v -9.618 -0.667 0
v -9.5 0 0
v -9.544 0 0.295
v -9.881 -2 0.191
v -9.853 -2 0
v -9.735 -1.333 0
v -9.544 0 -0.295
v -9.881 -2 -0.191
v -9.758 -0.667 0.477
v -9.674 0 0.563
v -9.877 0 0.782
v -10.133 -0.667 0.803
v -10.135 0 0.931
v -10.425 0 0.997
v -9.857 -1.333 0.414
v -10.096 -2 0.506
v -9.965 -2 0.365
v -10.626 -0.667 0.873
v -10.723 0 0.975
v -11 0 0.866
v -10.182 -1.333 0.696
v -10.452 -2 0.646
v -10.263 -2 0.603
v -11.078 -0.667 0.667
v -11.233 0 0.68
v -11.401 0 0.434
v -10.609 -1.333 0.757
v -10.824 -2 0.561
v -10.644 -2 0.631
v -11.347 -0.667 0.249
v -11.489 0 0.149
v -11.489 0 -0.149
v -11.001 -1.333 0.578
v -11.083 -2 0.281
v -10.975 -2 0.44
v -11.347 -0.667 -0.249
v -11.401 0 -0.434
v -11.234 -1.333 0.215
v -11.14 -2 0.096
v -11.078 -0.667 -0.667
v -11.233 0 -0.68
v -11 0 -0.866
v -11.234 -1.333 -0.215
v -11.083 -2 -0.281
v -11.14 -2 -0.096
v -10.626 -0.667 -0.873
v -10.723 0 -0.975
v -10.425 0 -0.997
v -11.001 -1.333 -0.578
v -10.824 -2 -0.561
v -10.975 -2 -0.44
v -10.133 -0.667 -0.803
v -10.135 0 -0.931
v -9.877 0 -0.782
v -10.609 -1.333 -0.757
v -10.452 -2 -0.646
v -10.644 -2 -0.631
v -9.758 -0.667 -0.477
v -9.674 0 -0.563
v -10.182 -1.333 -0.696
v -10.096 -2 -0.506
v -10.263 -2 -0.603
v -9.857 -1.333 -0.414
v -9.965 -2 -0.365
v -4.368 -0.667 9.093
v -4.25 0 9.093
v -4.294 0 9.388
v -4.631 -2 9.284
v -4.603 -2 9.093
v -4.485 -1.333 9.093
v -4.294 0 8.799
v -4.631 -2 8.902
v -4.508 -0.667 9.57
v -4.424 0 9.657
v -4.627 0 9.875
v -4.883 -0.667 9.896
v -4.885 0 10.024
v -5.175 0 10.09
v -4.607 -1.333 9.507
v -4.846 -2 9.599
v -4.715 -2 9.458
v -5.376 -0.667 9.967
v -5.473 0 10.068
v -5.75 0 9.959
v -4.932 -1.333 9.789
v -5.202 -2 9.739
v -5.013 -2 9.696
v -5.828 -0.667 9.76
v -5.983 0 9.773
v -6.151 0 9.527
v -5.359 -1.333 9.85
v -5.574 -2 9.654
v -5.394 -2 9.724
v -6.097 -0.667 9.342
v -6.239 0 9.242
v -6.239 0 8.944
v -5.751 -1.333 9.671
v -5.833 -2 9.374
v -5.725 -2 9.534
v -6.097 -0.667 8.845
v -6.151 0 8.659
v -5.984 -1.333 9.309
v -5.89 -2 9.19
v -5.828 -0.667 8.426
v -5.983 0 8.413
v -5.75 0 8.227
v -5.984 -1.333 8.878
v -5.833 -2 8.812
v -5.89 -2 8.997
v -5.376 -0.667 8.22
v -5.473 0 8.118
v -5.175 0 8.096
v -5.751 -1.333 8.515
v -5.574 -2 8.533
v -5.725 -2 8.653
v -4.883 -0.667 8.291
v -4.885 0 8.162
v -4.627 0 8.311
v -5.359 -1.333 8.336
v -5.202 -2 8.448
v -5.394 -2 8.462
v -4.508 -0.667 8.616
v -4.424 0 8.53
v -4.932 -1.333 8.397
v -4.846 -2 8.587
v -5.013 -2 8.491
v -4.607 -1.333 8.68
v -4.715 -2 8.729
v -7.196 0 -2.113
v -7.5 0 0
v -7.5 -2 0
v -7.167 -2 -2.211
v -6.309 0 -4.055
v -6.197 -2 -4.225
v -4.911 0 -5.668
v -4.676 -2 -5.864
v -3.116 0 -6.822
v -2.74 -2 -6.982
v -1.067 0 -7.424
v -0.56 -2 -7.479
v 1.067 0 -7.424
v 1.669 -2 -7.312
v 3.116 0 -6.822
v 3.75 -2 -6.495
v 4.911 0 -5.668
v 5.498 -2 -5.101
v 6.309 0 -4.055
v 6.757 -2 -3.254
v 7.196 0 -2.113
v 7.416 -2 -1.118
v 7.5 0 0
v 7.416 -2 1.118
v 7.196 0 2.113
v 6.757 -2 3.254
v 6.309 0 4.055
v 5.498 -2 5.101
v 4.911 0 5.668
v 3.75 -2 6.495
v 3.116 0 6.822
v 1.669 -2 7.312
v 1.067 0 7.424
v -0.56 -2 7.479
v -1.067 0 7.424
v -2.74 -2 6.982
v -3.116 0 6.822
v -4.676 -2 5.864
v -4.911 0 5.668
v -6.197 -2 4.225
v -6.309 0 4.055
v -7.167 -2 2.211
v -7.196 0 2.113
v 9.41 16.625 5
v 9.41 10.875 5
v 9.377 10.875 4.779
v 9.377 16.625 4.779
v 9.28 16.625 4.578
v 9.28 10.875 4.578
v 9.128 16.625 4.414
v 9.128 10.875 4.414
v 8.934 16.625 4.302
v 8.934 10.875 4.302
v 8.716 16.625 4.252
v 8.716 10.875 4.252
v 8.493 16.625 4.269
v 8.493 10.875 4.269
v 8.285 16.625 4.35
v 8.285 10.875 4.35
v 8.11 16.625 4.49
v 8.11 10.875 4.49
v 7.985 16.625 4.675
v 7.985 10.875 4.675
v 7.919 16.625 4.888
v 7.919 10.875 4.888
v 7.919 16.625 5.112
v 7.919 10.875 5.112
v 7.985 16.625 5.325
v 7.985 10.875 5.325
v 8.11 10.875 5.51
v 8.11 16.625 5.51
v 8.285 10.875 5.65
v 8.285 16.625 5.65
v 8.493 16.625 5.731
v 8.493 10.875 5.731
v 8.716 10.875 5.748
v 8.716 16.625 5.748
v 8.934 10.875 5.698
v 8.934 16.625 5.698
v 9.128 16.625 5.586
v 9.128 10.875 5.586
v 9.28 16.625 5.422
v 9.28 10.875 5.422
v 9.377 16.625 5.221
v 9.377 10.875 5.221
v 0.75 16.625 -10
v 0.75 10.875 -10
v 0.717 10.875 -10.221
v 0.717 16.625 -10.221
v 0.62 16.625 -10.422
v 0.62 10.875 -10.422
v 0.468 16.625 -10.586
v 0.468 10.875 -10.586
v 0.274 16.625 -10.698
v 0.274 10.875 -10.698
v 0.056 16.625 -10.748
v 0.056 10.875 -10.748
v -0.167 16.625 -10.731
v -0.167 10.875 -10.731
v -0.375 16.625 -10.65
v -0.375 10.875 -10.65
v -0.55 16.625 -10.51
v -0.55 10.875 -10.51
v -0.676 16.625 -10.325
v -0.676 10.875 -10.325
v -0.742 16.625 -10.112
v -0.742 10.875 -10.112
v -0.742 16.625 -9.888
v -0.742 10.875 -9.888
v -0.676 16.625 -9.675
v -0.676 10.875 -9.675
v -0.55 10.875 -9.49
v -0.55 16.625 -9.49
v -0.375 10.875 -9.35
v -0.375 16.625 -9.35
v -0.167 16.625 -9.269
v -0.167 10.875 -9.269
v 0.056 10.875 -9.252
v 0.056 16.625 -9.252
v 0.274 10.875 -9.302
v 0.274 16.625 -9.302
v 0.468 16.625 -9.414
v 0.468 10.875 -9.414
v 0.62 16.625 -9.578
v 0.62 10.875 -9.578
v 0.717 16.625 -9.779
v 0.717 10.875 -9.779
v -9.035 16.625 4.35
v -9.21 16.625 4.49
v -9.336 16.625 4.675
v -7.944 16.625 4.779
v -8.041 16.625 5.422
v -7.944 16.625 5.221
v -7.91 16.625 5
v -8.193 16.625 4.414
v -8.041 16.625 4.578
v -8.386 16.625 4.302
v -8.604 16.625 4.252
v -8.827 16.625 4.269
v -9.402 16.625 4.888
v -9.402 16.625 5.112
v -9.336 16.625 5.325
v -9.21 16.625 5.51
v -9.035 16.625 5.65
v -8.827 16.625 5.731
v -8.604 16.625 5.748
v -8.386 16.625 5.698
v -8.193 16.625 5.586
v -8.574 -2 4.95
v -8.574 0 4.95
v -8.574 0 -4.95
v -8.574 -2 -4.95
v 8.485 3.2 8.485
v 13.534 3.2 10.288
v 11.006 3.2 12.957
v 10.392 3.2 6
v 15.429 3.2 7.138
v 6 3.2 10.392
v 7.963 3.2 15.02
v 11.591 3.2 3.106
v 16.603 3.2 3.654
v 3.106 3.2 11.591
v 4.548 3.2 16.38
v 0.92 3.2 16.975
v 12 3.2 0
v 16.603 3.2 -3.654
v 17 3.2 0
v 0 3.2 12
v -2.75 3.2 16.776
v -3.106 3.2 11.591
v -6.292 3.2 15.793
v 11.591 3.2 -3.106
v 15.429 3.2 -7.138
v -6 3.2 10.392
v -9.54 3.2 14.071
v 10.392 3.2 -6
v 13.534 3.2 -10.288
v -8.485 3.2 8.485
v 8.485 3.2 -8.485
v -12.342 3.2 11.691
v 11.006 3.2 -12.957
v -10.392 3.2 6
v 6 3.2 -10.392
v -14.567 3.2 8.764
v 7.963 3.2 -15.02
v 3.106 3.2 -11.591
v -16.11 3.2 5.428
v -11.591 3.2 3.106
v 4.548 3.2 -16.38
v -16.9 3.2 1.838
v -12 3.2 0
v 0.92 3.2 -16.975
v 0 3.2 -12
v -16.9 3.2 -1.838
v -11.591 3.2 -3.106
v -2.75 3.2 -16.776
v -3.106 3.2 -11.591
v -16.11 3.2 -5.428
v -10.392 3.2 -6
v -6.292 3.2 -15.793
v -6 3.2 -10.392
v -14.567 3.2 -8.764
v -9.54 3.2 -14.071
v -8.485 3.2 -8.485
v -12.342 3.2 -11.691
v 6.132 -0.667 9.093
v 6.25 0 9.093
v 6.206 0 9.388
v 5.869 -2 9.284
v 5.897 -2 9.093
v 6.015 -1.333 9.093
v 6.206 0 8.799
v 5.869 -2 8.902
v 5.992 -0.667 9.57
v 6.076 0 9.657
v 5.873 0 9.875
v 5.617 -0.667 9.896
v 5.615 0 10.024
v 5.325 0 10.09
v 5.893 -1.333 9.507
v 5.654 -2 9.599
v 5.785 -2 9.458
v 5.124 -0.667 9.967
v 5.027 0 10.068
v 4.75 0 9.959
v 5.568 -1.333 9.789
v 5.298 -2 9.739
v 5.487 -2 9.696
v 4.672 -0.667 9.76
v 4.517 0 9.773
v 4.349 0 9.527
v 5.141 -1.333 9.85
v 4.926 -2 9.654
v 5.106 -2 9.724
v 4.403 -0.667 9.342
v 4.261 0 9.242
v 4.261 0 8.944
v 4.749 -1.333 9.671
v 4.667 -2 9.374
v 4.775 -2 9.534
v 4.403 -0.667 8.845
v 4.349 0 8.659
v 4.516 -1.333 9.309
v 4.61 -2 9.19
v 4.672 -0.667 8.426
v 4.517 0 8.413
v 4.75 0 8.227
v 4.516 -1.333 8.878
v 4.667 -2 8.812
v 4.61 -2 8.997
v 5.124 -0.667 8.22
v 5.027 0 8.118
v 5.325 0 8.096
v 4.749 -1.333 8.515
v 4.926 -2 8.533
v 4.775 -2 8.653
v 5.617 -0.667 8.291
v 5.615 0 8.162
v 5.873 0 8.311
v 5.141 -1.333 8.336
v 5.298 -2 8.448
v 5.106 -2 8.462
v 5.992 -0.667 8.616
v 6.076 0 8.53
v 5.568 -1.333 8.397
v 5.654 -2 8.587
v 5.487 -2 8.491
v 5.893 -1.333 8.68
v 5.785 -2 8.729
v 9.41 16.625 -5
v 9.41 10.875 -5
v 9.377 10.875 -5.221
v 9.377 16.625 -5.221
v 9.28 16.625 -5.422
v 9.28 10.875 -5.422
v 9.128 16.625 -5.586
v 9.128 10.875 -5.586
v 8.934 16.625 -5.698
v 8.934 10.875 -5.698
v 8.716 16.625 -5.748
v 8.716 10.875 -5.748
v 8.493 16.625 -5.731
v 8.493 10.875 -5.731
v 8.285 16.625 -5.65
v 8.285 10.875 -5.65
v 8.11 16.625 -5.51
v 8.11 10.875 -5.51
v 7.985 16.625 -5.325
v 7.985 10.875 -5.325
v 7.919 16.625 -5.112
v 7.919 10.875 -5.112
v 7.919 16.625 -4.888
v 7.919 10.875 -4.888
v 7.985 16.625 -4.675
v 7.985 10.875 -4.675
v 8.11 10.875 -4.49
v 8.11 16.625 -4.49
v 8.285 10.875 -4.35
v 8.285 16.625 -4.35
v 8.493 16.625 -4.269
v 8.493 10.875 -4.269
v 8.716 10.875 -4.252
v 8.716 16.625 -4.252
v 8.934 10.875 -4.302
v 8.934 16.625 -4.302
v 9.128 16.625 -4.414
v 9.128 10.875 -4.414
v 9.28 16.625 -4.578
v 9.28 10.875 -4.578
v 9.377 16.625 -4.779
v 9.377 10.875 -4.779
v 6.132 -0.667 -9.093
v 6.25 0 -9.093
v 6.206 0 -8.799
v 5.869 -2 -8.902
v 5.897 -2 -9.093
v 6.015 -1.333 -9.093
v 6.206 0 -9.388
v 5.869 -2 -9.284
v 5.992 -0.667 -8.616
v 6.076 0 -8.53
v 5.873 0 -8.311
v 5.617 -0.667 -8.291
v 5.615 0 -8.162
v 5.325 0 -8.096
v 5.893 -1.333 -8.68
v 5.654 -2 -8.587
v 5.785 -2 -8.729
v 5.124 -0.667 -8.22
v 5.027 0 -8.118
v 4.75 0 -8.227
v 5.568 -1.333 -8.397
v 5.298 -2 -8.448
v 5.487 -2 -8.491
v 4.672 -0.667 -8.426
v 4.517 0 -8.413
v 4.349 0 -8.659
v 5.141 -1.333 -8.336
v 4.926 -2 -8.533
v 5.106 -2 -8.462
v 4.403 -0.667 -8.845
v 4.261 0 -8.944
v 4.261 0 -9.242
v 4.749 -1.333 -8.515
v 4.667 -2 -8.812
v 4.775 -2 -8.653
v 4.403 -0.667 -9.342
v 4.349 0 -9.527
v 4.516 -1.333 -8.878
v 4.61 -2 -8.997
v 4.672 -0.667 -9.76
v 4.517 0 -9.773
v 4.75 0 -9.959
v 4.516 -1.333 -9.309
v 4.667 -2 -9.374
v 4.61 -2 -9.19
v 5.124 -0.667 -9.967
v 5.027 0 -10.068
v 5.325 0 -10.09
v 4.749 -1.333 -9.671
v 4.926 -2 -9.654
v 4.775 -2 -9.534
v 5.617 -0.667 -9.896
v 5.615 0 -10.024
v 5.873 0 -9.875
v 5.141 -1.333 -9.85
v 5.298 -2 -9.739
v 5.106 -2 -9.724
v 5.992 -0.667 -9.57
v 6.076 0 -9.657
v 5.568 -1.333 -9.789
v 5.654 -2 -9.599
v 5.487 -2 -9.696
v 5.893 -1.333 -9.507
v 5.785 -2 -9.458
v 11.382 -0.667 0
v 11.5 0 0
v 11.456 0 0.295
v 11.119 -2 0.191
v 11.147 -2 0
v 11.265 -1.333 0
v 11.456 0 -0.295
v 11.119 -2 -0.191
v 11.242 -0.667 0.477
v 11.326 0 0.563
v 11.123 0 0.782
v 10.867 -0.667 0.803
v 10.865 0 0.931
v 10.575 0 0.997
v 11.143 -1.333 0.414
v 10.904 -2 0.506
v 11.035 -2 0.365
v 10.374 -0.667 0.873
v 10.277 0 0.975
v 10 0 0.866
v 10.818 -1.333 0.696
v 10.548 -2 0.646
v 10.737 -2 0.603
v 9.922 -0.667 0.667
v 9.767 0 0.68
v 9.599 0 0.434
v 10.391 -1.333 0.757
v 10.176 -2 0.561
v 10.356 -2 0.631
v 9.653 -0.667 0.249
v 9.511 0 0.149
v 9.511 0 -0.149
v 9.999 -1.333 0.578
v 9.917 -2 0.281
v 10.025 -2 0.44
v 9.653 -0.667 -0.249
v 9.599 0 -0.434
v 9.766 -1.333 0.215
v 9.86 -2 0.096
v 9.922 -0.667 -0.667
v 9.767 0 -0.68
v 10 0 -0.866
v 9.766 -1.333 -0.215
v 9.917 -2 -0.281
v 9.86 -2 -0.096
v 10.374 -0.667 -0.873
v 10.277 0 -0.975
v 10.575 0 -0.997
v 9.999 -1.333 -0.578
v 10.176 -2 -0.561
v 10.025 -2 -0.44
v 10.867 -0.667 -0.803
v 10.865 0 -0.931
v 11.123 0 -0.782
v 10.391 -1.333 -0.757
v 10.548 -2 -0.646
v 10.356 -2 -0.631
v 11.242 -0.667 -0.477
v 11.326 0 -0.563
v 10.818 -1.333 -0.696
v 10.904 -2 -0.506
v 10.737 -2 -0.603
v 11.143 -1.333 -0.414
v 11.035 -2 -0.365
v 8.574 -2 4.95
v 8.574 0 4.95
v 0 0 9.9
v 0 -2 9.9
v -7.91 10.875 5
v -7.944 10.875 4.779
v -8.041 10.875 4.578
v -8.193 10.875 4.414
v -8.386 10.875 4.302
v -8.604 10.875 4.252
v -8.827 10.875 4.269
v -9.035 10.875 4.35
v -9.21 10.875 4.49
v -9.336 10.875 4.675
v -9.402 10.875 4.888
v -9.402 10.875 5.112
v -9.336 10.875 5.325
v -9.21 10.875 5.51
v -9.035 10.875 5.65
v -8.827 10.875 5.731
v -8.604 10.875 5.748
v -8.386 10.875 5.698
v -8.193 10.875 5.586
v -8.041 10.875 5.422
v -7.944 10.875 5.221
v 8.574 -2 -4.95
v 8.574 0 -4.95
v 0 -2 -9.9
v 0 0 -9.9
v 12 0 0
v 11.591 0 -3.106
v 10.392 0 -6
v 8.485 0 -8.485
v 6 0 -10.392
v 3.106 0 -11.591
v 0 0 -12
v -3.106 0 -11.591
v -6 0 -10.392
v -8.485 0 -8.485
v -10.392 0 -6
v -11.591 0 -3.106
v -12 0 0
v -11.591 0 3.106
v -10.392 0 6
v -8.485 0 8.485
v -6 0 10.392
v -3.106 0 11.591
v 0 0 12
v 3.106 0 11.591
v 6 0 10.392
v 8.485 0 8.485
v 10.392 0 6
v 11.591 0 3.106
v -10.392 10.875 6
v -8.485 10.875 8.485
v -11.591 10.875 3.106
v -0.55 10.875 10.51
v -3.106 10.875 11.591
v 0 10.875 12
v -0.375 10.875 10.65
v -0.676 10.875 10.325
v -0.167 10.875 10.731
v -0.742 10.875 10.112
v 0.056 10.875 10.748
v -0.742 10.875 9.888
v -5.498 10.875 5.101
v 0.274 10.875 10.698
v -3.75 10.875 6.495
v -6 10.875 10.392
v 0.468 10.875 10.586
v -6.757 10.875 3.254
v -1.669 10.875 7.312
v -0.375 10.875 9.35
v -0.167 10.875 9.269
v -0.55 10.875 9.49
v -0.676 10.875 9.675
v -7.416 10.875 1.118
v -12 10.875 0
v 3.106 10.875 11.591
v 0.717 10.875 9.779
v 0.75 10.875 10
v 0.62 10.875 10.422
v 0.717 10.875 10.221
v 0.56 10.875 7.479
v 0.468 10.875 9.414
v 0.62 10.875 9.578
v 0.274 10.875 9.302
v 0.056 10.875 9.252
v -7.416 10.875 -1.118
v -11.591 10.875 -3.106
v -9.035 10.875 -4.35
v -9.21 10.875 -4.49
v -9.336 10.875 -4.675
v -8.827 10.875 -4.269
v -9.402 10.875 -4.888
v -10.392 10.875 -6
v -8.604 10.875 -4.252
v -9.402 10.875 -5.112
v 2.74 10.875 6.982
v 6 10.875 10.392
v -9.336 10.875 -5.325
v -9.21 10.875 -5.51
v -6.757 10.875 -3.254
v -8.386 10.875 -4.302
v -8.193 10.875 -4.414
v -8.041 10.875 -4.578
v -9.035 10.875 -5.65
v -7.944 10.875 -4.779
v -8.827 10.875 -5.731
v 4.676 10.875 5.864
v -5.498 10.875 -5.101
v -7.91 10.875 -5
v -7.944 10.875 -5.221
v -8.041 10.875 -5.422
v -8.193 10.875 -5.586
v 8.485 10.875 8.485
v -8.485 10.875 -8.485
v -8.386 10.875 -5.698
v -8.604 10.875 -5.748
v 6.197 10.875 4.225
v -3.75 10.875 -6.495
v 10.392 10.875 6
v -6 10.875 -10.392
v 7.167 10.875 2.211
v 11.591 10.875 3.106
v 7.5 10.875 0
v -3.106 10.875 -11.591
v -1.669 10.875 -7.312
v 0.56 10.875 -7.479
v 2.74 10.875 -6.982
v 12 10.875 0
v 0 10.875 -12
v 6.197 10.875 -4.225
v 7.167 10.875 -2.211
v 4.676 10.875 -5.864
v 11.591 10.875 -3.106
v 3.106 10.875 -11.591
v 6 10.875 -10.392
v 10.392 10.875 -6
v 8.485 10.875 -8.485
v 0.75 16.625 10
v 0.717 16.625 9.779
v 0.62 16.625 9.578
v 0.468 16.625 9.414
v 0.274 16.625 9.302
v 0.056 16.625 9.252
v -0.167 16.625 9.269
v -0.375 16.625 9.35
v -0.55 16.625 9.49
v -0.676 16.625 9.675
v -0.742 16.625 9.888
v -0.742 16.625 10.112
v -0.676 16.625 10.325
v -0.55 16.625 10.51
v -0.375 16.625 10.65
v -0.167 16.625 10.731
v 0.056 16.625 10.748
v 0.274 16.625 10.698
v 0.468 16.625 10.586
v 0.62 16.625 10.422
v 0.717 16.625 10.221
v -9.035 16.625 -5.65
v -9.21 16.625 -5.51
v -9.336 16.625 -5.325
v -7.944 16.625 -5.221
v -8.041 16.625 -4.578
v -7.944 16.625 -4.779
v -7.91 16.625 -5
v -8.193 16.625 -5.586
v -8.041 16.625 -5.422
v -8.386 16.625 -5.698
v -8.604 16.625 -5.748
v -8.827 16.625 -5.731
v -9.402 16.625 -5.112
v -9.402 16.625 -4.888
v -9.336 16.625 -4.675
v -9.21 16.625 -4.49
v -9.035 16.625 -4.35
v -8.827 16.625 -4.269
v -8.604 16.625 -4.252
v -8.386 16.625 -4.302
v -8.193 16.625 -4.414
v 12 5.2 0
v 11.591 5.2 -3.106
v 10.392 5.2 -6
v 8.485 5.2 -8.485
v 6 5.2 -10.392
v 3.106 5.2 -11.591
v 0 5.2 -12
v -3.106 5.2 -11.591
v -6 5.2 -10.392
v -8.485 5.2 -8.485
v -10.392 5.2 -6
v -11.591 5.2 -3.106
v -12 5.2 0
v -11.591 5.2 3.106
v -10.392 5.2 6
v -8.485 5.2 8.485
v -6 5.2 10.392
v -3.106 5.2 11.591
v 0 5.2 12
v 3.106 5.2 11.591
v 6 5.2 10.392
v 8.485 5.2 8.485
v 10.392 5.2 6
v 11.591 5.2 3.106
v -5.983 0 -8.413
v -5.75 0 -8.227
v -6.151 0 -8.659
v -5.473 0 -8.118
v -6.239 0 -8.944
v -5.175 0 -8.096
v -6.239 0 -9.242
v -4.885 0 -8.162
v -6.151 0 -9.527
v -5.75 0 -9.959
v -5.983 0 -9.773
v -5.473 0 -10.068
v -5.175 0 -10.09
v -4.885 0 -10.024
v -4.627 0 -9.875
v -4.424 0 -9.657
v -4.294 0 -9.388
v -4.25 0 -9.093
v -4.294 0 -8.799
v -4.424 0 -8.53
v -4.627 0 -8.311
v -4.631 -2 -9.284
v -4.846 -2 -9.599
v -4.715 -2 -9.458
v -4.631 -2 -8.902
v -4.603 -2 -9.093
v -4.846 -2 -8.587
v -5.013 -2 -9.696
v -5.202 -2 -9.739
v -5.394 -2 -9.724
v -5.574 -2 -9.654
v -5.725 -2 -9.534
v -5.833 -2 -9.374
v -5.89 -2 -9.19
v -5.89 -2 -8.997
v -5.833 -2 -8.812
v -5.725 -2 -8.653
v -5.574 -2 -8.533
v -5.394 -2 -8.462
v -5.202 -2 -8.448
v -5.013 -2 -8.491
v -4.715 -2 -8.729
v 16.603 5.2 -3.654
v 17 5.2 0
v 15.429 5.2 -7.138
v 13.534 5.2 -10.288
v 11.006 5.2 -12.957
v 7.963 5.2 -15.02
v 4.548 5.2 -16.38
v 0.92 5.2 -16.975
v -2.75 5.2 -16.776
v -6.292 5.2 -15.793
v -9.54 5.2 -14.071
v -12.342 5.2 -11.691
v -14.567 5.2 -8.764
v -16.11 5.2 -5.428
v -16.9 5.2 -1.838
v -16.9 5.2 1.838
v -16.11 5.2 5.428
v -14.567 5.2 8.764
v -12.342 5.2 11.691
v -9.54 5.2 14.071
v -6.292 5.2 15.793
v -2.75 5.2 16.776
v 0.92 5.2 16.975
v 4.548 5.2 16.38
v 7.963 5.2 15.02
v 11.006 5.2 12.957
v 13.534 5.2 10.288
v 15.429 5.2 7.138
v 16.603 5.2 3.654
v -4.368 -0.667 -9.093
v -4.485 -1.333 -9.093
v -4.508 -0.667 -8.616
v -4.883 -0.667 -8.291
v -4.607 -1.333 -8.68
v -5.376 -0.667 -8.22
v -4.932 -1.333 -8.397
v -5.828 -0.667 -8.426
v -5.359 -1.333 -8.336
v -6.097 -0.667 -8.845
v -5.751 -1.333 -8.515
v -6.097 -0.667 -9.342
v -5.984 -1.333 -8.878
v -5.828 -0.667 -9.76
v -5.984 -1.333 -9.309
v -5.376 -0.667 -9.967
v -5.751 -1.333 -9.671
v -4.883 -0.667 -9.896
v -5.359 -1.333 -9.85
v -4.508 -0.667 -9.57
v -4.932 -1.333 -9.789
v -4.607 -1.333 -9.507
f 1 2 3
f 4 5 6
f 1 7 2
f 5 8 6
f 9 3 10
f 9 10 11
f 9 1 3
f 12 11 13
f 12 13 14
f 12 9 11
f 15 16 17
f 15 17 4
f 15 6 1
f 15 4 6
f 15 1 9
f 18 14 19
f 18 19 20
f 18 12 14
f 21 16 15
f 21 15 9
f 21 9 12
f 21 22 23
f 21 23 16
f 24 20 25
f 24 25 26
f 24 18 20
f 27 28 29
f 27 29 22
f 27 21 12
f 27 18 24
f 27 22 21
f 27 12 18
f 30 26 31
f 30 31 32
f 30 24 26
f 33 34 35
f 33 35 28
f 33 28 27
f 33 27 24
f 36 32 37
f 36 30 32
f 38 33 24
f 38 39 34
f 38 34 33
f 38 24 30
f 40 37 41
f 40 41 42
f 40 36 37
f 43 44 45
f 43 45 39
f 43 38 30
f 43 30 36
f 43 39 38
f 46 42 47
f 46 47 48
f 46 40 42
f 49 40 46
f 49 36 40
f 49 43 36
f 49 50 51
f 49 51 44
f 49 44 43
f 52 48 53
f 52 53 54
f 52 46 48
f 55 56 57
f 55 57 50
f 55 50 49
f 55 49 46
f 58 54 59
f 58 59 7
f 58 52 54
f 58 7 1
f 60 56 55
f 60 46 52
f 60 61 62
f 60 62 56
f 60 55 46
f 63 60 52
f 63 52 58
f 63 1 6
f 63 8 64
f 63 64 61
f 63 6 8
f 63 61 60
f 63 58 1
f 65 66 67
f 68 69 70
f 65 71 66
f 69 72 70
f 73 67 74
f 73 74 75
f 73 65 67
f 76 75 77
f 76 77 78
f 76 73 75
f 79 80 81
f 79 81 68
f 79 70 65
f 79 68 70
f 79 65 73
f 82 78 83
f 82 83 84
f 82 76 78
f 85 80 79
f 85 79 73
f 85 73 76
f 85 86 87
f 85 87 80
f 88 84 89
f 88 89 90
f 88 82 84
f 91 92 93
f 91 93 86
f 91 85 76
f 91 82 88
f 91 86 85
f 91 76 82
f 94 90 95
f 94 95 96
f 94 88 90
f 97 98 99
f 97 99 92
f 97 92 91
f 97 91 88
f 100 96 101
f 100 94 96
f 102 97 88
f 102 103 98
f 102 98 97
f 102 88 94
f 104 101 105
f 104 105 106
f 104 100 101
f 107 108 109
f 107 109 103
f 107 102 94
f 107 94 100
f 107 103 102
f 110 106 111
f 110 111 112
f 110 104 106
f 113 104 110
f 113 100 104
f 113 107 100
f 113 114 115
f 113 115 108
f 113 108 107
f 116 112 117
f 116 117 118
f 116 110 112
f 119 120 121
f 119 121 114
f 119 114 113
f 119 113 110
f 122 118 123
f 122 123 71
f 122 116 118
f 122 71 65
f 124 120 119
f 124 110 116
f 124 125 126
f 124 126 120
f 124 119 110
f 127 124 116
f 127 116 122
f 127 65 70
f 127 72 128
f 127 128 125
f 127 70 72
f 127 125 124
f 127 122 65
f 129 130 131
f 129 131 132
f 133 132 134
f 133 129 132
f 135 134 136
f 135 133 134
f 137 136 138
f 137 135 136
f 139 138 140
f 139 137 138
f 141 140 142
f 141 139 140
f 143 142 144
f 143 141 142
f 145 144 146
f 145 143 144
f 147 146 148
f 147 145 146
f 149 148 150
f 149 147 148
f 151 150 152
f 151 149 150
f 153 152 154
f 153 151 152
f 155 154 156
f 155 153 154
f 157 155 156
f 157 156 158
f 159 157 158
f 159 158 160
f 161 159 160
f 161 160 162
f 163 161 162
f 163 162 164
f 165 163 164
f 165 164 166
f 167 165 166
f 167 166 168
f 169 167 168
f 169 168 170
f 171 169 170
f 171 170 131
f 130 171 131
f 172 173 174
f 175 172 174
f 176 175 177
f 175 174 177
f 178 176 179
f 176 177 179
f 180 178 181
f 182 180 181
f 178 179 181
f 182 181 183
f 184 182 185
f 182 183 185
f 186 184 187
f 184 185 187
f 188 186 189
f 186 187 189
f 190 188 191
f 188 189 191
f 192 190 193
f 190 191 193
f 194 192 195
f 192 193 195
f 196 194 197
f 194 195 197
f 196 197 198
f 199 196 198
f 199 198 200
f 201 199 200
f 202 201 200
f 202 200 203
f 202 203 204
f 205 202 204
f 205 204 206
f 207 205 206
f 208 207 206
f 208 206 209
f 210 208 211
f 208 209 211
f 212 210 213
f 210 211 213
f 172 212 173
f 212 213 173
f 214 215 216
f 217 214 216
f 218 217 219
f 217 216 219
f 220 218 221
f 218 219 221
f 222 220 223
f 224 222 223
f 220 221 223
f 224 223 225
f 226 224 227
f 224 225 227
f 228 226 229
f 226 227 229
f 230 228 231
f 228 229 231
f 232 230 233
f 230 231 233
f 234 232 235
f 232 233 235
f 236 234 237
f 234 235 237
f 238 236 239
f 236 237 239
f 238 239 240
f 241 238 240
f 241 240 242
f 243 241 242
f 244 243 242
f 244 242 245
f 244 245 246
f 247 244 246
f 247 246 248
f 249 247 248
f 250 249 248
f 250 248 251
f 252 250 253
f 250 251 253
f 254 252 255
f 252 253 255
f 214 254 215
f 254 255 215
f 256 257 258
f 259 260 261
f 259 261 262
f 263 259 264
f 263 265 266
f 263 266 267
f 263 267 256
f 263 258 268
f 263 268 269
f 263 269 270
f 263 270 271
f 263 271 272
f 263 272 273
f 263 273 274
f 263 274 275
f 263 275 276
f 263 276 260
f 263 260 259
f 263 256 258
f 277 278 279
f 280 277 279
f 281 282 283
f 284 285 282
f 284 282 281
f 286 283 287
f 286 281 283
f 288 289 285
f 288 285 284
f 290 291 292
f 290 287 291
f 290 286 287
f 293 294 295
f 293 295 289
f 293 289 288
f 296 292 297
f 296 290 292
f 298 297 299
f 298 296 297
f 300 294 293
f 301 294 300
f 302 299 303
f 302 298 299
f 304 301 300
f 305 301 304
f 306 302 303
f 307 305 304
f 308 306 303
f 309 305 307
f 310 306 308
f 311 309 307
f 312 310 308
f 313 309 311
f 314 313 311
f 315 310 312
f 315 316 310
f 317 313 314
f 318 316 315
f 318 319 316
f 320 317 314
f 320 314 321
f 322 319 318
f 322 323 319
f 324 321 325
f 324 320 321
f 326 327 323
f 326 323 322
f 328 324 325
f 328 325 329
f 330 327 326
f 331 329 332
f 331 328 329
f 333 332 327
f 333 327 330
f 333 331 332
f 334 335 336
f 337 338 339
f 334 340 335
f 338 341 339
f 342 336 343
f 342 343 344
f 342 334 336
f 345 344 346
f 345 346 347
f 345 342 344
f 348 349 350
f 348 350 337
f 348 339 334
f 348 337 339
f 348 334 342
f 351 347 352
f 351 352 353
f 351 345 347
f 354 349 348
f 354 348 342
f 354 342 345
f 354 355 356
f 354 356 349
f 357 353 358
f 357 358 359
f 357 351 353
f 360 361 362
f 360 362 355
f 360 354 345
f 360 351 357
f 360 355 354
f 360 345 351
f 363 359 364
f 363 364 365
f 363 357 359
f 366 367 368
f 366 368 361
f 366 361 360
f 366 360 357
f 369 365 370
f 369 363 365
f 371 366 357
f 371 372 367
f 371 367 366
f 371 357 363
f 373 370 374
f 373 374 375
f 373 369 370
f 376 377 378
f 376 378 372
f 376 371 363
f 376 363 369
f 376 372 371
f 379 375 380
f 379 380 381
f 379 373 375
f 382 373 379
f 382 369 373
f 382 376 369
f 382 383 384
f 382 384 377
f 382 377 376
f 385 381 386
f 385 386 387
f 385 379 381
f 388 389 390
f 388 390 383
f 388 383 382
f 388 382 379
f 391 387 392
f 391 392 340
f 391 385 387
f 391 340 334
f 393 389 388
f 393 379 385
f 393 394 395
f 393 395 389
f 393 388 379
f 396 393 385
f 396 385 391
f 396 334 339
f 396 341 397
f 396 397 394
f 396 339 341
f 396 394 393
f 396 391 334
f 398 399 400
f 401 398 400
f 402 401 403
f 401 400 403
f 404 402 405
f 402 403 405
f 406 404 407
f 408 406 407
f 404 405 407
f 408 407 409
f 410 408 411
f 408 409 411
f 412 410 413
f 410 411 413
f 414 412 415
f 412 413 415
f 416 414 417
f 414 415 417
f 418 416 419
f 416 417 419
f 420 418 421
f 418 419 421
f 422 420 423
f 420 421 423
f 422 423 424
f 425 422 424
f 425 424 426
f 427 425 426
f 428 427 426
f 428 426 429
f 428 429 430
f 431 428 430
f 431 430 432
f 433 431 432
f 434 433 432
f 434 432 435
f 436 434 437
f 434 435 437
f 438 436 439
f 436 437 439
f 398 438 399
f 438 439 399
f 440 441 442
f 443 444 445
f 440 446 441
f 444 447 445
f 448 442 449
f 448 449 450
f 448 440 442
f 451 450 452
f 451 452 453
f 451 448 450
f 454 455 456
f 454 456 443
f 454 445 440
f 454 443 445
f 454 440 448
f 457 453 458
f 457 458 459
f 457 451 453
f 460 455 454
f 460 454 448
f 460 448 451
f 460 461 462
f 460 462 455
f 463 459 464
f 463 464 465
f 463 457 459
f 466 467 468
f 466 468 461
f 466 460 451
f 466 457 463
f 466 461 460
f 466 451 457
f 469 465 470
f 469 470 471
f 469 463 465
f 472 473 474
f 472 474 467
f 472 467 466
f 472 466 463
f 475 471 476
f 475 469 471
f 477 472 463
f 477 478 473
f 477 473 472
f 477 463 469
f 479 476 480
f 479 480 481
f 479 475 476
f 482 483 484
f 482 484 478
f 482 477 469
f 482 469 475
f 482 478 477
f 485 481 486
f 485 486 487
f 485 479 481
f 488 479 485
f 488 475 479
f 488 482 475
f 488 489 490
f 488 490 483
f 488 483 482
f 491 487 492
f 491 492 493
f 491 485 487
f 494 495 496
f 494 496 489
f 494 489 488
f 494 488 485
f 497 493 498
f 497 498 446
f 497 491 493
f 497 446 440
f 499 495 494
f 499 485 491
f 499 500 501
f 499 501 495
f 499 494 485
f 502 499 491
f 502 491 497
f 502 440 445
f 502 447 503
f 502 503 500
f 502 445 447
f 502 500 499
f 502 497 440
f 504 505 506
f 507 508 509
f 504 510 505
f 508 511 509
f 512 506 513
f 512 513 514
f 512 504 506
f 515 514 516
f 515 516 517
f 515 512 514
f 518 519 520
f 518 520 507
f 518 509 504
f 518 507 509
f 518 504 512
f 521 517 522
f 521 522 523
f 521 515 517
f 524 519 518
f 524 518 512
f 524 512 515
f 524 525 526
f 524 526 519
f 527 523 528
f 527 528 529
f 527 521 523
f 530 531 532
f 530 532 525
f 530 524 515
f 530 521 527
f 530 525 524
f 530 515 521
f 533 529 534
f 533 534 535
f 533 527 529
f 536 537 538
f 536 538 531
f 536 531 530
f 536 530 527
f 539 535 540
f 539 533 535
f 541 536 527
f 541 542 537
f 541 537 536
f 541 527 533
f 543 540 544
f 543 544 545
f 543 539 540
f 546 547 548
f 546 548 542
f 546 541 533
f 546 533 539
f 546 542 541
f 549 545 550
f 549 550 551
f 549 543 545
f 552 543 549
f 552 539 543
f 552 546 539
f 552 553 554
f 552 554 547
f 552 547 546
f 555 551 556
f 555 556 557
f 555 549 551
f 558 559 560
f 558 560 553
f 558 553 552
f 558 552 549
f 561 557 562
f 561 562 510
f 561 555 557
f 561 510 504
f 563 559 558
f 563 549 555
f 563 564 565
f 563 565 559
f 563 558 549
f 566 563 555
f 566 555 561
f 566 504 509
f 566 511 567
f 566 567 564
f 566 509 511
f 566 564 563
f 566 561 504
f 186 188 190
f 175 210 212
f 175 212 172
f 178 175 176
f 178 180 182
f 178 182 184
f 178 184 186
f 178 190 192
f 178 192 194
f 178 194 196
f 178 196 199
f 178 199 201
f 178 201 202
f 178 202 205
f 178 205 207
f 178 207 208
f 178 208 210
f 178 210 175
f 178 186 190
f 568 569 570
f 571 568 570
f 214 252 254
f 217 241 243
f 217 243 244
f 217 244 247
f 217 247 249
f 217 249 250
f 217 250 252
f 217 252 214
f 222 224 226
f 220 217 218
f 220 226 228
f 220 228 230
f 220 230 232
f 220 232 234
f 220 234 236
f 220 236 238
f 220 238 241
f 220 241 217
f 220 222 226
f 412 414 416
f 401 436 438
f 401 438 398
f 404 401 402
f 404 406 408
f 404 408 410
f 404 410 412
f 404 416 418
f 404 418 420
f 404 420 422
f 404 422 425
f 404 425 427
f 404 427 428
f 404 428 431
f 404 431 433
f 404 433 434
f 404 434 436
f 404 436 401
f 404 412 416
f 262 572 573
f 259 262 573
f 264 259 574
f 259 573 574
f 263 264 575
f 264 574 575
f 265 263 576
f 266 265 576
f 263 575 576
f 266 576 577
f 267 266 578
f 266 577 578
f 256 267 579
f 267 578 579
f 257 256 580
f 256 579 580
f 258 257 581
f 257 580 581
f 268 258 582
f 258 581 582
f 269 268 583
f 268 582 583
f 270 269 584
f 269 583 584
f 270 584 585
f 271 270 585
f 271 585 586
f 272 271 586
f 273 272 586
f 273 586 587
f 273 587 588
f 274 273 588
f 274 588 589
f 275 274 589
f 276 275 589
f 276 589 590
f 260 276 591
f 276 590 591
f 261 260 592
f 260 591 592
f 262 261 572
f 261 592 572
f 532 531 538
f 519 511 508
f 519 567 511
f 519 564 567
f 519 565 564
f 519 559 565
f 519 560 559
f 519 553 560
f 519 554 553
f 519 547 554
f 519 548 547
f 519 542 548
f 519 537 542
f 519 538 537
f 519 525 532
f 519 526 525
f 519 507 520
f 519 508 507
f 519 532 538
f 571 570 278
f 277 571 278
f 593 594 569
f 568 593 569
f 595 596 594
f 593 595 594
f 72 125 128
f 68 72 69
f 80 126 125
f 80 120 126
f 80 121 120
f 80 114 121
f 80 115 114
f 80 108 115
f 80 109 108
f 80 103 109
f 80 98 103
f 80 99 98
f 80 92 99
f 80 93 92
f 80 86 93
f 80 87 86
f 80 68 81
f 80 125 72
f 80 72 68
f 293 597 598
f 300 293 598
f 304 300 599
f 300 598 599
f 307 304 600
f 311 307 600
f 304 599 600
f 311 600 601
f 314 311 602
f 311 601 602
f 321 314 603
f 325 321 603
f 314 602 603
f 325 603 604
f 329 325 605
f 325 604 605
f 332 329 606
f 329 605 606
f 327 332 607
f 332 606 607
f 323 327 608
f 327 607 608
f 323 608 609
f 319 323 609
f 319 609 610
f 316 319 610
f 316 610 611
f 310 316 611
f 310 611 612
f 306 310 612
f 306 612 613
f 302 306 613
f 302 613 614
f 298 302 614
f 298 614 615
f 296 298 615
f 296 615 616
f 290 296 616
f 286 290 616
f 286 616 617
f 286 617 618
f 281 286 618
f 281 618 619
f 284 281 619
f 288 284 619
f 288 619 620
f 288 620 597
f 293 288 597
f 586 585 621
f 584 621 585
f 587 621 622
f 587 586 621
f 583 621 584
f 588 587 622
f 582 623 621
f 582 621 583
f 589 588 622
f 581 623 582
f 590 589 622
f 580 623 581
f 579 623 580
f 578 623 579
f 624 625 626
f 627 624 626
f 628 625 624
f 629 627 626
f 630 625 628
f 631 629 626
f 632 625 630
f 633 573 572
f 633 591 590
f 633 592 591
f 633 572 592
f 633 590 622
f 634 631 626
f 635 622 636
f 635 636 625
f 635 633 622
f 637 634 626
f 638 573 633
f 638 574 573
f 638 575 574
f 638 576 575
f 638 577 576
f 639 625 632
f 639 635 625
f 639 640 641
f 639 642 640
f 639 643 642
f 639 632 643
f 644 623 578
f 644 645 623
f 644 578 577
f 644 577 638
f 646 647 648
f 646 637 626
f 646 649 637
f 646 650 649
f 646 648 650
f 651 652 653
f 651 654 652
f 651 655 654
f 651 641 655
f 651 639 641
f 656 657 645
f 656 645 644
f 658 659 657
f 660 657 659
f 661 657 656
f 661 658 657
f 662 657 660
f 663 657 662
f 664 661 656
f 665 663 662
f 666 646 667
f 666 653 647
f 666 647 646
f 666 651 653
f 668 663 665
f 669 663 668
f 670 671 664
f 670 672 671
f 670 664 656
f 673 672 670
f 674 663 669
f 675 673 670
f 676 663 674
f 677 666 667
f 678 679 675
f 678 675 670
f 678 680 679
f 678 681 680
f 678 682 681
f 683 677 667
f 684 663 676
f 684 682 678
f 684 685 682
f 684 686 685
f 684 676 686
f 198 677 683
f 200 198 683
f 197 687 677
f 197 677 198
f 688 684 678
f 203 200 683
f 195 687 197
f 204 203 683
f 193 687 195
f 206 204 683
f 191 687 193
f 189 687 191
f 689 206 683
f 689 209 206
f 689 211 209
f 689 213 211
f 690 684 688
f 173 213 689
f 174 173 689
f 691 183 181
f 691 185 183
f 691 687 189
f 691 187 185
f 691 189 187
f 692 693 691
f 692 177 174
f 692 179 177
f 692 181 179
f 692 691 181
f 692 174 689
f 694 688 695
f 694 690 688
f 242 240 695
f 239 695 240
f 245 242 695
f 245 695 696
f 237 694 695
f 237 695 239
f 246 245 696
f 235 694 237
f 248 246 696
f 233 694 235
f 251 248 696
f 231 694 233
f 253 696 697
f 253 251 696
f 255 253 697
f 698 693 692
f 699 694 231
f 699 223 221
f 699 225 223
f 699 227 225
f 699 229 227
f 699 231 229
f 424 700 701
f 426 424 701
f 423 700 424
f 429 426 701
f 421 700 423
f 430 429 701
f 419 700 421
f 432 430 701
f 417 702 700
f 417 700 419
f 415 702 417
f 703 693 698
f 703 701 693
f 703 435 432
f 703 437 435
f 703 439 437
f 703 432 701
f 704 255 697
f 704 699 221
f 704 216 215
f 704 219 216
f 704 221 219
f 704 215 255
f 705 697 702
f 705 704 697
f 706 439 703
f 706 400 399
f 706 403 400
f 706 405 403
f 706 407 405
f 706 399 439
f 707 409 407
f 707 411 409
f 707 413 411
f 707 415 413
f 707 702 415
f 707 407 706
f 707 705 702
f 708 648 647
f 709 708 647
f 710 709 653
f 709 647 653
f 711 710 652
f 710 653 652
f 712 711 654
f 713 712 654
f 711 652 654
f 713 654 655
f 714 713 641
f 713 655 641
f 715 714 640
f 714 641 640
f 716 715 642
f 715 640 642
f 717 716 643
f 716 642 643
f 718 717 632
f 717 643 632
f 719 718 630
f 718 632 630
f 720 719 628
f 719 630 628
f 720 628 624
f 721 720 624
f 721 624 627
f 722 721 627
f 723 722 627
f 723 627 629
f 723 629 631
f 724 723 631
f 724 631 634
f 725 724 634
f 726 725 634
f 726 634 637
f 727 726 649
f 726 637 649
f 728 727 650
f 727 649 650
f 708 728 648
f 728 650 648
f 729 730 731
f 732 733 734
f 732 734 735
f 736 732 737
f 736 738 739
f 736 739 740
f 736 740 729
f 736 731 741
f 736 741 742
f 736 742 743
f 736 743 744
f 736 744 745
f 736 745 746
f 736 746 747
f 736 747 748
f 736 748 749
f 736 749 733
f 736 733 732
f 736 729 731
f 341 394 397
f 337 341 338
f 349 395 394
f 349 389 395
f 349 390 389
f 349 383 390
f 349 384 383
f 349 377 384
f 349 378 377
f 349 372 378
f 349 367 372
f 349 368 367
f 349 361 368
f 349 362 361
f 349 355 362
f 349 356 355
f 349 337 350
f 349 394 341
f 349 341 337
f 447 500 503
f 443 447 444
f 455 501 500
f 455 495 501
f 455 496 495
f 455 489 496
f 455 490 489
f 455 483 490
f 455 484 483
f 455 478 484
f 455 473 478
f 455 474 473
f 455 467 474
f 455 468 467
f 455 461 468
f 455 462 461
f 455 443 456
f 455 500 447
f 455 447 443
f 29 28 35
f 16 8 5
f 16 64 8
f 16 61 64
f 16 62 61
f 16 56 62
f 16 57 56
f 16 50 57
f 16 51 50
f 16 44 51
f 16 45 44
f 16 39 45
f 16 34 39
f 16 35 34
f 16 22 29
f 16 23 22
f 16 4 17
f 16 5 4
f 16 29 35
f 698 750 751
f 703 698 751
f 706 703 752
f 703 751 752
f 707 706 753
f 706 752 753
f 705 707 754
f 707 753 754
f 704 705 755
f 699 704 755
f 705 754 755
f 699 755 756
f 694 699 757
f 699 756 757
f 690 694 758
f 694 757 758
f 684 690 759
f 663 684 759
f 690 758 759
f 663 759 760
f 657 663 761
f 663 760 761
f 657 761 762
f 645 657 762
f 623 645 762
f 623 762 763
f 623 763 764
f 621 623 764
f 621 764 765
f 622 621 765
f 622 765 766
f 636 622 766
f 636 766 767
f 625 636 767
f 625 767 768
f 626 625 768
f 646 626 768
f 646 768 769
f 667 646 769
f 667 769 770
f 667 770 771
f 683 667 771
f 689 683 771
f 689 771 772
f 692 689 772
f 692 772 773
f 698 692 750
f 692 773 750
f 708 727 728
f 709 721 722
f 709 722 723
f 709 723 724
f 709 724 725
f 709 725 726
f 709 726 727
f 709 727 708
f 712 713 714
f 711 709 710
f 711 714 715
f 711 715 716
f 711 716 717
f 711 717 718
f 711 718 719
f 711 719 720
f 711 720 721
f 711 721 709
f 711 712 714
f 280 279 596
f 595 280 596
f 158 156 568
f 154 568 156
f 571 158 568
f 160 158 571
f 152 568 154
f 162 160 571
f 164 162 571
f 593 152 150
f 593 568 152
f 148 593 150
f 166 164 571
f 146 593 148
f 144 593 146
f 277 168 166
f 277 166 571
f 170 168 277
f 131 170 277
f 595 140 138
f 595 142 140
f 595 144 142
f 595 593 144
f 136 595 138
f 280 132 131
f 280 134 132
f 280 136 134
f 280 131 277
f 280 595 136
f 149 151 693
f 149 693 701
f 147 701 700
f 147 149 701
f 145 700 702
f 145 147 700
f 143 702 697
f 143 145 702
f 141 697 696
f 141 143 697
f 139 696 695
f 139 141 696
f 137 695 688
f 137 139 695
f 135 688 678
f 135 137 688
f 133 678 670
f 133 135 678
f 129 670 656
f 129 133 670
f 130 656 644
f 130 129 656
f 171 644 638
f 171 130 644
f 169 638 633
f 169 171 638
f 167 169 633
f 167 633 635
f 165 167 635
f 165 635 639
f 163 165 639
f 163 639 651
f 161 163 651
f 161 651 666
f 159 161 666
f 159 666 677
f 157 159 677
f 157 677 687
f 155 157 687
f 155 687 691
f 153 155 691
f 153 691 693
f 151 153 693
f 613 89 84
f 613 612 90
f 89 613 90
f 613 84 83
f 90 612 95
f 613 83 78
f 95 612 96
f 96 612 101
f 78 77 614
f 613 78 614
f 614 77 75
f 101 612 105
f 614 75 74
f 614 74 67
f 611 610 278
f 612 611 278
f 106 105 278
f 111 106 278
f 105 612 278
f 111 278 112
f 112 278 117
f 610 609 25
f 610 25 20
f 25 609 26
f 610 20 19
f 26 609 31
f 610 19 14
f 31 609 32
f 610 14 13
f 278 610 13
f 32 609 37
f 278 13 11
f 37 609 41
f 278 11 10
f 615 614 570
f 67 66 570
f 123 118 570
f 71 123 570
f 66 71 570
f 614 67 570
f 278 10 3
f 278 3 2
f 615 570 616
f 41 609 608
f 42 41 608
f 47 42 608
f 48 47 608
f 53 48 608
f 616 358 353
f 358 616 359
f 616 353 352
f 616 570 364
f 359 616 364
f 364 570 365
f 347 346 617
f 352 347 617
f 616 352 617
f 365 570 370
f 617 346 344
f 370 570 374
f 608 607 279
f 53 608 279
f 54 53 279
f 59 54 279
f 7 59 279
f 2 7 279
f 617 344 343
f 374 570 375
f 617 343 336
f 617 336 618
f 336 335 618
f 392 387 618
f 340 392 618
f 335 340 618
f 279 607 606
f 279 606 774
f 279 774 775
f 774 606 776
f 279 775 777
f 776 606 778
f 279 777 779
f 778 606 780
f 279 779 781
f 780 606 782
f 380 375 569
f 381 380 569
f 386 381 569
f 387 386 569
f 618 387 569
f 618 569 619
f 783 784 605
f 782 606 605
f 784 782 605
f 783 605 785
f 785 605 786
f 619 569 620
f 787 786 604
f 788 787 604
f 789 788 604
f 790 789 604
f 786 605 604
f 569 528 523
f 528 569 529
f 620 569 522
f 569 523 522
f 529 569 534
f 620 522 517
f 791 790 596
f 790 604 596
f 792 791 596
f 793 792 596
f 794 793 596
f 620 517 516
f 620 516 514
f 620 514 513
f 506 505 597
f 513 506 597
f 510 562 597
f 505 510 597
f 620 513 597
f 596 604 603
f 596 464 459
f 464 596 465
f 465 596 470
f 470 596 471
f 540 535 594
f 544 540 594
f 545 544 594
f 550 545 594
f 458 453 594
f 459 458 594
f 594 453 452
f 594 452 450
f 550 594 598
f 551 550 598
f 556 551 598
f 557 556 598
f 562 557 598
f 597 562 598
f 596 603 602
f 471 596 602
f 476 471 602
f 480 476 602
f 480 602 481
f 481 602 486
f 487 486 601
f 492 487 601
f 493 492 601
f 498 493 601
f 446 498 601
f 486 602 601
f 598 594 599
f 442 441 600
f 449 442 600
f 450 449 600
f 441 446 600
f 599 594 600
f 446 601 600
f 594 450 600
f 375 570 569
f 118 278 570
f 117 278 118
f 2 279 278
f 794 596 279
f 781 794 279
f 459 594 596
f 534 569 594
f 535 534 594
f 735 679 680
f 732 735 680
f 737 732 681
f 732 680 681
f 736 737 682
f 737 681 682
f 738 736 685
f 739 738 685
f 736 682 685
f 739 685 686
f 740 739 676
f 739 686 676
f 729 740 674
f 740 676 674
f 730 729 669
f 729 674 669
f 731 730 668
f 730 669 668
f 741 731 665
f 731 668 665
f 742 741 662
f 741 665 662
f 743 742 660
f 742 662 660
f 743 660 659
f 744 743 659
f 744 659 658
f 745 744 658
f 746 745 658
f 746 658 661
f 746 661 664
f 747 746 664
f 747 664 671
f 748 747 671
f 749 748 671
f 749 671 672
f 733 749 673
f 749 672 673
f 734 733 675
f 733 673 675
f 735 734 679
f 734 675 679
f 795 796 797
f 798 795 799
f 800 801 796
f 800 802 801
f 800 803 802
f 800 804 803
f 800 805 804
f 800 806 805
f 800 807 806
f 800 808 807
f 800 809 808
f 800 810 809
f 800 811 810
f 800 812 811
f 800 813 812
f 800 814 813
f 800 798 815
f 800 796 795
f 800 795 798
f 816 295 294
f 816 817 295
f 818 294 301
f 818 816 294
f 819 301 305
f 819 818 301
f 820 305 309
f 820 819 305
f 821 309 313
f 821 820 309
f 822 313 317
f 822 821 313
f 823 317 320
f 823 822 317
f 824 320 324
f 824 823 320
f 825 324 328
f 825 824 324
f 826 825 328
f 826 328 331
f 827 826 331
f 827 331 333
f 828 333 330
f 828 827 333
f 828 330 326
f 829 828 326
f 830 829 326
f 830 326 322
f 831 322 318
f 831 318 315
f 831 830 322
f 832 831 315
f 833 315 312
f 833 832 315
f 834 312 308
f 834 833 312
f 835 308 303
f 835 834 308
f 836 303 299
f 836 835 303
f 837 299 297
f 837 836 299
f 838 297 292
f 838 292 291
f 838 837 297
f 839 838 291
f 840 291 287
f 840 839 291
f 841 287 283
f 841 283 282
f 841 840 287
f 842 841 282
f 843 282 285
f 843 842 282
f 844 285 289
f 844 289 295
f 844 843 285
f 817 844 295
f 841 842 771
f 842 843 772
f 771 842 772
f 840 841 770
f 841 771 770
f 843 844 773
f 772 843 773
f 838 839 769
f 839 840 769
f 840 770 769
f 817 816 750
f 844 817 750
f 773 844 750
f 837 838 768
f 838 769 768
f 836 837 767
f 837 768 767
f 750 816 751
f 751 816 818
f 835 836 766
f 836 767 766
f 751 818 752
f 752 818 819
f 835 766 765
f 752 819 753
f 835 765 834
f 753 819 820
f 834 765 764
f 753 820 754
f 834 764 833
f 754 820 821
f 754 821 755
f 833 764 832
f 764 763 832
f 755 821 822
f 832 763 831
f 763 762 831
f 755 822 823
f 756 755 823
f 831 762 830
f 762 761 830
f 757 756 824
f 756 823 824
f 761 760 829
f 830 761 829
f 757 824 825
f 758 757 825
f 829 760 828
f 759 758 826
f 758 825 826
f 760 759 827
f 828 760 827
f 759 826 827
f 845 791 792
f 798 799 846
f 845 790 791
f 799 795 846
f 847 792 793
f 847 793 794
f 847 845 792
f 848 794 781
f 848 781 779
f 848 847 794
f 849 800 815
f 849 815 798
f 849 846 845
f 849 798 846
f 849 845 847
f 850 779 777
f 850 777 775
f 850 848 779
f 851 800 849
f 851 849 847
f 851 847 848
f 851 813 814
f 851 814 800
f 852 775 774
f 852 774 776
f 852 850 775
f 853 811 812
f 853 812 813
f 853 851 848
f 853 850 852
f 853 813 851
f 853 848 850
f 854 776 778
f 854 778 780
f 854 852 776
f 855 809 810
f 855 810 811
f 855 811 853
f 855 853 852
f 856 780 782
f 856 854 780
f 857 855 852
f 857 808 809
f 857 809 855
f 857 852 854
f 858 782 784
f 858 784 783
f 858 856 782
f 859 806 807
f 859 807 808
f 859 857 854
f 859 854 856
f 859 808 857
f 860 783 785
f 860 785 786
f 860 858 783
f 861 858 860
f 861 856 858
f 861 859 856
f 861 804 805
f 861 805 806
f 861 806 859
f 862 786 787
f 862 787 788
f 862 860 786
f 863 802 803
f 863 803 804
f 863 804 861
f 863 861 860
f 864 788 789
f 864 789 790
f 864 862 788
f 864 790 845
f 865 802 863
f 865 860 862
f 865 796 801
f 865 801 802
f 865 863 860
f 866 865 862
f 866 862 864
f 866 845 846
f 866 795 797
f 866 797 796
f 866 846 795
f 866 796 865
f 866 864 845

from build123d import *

# Parameters (mm, degrees)
SKETCH1_R           = 12
SKETCH1_R_2         = 7.5
BOSS_EXTRUDE1_DEPTH = 10.875
SKETCH2_R           = 0.75
BOSS_EXTRUDE2_DEPTH = 5.75
SKETCH3_R           = 7.5
BOSS_EXTRUDE3_DEPTH = 2
SKETCH4_W           = 5
SKETCH4_H           = 2
SKETCH5_R           = 1
BOSS_EXTRUDE4_DEPTH = 2
BOSS_EXTRUDE4_TAPER = 10


with BuildPart() as part:
    # Sketch1 → Boss-Extrude1 (new body)
    with BuildSketch(Plane(origin=(0, 0, 0), x_dir=(1, 0, 0), z_dir=(0, 1, 0))):
        Circle(SKETCH1_R)
        Circle(SKETCH1_R_2, mode=Mode.SUBTRACT)
    extrude(amount=BOSS_EXTRUDE1_DEPTH)

    # Sketch2 → Boss-Extrude2 (add)
    with BuildSketch(Plane(origin=(0, 10.875, 0), x_dir=(1, 0, 0), z_dir=(0, 1, 0))):
        with Locations((0, 10)):
            Circle(SKETCH2_R)
        with Locations((-8.660254038, 5)):
            Circle(SKETCH2_R)
        with Locations((-8.660254038, -5)):
            Circle(SKETCH2_R)
        with Locations((0, -10)):
            Circle(SKETCH2_R)
        with Locations((8.660254038, -5)):
            Circle(SKETCH2_R)
        with Locations((8.660254038, 5)):
            Circle(SKETCH2_R)
    extrude(amount=BOSS_EXTRUDE2_DEPTH)

    # Sketch3 → Boss-Extrude3 (add)
    with BuildSketch(Plane(origin=(0, 0, 0), x_dir=(-1, 0, 0), z_dir=(0, -1, 0))):
        Polygon((0, -9.9), (8.573651497, -4.95), (8.573651497, 4.95), (0, 9.9), (-8.573651497, 4.95), (-8.573651497, -4.95), align=None)
        Circle(SKETCH3_R, mode=Mode.SUBTRACT)
    extrude(amount=BOSS_EXTRUDE3_DEPTH)

    # Sketch4 → Revolve1 (revolve)
    with BuildSketch(Plane.XY):
        with Locations((14.5, 4.2)):
            Rectangle(SKETCH4_W, SKETCH4_H)
    revolve(axis=Axis((0, -2, 0), (0, 1, 0)))

    # Sketch5 → Boss-Extrude4 (add)
    with BuildSketch(Plane.XZ):
        with Locations((-5.25, 9.09326674)):
            Circle(SKETCH5_R)
        with Locations((5.25, 9.09326674)):
            Circle(SKETCH5_R)
        with Locations((10.5, 0)):
            Circle(SKETCH5_R)
        with Locations((5.25, -9.09326674)):
            Circle(SKETCH5_R)
        with Locations((-5.25, -9.09326674)):
            Circle(SKETCH5_R)
        with Locations((-10.5, 0)):
            Circle(SKETCH5_R)
    extrude(amount=BOSS_EXTRUDE4_DEPTH, taper=BOSS_EXTRUDE4_TAPER)


solid = part.part
